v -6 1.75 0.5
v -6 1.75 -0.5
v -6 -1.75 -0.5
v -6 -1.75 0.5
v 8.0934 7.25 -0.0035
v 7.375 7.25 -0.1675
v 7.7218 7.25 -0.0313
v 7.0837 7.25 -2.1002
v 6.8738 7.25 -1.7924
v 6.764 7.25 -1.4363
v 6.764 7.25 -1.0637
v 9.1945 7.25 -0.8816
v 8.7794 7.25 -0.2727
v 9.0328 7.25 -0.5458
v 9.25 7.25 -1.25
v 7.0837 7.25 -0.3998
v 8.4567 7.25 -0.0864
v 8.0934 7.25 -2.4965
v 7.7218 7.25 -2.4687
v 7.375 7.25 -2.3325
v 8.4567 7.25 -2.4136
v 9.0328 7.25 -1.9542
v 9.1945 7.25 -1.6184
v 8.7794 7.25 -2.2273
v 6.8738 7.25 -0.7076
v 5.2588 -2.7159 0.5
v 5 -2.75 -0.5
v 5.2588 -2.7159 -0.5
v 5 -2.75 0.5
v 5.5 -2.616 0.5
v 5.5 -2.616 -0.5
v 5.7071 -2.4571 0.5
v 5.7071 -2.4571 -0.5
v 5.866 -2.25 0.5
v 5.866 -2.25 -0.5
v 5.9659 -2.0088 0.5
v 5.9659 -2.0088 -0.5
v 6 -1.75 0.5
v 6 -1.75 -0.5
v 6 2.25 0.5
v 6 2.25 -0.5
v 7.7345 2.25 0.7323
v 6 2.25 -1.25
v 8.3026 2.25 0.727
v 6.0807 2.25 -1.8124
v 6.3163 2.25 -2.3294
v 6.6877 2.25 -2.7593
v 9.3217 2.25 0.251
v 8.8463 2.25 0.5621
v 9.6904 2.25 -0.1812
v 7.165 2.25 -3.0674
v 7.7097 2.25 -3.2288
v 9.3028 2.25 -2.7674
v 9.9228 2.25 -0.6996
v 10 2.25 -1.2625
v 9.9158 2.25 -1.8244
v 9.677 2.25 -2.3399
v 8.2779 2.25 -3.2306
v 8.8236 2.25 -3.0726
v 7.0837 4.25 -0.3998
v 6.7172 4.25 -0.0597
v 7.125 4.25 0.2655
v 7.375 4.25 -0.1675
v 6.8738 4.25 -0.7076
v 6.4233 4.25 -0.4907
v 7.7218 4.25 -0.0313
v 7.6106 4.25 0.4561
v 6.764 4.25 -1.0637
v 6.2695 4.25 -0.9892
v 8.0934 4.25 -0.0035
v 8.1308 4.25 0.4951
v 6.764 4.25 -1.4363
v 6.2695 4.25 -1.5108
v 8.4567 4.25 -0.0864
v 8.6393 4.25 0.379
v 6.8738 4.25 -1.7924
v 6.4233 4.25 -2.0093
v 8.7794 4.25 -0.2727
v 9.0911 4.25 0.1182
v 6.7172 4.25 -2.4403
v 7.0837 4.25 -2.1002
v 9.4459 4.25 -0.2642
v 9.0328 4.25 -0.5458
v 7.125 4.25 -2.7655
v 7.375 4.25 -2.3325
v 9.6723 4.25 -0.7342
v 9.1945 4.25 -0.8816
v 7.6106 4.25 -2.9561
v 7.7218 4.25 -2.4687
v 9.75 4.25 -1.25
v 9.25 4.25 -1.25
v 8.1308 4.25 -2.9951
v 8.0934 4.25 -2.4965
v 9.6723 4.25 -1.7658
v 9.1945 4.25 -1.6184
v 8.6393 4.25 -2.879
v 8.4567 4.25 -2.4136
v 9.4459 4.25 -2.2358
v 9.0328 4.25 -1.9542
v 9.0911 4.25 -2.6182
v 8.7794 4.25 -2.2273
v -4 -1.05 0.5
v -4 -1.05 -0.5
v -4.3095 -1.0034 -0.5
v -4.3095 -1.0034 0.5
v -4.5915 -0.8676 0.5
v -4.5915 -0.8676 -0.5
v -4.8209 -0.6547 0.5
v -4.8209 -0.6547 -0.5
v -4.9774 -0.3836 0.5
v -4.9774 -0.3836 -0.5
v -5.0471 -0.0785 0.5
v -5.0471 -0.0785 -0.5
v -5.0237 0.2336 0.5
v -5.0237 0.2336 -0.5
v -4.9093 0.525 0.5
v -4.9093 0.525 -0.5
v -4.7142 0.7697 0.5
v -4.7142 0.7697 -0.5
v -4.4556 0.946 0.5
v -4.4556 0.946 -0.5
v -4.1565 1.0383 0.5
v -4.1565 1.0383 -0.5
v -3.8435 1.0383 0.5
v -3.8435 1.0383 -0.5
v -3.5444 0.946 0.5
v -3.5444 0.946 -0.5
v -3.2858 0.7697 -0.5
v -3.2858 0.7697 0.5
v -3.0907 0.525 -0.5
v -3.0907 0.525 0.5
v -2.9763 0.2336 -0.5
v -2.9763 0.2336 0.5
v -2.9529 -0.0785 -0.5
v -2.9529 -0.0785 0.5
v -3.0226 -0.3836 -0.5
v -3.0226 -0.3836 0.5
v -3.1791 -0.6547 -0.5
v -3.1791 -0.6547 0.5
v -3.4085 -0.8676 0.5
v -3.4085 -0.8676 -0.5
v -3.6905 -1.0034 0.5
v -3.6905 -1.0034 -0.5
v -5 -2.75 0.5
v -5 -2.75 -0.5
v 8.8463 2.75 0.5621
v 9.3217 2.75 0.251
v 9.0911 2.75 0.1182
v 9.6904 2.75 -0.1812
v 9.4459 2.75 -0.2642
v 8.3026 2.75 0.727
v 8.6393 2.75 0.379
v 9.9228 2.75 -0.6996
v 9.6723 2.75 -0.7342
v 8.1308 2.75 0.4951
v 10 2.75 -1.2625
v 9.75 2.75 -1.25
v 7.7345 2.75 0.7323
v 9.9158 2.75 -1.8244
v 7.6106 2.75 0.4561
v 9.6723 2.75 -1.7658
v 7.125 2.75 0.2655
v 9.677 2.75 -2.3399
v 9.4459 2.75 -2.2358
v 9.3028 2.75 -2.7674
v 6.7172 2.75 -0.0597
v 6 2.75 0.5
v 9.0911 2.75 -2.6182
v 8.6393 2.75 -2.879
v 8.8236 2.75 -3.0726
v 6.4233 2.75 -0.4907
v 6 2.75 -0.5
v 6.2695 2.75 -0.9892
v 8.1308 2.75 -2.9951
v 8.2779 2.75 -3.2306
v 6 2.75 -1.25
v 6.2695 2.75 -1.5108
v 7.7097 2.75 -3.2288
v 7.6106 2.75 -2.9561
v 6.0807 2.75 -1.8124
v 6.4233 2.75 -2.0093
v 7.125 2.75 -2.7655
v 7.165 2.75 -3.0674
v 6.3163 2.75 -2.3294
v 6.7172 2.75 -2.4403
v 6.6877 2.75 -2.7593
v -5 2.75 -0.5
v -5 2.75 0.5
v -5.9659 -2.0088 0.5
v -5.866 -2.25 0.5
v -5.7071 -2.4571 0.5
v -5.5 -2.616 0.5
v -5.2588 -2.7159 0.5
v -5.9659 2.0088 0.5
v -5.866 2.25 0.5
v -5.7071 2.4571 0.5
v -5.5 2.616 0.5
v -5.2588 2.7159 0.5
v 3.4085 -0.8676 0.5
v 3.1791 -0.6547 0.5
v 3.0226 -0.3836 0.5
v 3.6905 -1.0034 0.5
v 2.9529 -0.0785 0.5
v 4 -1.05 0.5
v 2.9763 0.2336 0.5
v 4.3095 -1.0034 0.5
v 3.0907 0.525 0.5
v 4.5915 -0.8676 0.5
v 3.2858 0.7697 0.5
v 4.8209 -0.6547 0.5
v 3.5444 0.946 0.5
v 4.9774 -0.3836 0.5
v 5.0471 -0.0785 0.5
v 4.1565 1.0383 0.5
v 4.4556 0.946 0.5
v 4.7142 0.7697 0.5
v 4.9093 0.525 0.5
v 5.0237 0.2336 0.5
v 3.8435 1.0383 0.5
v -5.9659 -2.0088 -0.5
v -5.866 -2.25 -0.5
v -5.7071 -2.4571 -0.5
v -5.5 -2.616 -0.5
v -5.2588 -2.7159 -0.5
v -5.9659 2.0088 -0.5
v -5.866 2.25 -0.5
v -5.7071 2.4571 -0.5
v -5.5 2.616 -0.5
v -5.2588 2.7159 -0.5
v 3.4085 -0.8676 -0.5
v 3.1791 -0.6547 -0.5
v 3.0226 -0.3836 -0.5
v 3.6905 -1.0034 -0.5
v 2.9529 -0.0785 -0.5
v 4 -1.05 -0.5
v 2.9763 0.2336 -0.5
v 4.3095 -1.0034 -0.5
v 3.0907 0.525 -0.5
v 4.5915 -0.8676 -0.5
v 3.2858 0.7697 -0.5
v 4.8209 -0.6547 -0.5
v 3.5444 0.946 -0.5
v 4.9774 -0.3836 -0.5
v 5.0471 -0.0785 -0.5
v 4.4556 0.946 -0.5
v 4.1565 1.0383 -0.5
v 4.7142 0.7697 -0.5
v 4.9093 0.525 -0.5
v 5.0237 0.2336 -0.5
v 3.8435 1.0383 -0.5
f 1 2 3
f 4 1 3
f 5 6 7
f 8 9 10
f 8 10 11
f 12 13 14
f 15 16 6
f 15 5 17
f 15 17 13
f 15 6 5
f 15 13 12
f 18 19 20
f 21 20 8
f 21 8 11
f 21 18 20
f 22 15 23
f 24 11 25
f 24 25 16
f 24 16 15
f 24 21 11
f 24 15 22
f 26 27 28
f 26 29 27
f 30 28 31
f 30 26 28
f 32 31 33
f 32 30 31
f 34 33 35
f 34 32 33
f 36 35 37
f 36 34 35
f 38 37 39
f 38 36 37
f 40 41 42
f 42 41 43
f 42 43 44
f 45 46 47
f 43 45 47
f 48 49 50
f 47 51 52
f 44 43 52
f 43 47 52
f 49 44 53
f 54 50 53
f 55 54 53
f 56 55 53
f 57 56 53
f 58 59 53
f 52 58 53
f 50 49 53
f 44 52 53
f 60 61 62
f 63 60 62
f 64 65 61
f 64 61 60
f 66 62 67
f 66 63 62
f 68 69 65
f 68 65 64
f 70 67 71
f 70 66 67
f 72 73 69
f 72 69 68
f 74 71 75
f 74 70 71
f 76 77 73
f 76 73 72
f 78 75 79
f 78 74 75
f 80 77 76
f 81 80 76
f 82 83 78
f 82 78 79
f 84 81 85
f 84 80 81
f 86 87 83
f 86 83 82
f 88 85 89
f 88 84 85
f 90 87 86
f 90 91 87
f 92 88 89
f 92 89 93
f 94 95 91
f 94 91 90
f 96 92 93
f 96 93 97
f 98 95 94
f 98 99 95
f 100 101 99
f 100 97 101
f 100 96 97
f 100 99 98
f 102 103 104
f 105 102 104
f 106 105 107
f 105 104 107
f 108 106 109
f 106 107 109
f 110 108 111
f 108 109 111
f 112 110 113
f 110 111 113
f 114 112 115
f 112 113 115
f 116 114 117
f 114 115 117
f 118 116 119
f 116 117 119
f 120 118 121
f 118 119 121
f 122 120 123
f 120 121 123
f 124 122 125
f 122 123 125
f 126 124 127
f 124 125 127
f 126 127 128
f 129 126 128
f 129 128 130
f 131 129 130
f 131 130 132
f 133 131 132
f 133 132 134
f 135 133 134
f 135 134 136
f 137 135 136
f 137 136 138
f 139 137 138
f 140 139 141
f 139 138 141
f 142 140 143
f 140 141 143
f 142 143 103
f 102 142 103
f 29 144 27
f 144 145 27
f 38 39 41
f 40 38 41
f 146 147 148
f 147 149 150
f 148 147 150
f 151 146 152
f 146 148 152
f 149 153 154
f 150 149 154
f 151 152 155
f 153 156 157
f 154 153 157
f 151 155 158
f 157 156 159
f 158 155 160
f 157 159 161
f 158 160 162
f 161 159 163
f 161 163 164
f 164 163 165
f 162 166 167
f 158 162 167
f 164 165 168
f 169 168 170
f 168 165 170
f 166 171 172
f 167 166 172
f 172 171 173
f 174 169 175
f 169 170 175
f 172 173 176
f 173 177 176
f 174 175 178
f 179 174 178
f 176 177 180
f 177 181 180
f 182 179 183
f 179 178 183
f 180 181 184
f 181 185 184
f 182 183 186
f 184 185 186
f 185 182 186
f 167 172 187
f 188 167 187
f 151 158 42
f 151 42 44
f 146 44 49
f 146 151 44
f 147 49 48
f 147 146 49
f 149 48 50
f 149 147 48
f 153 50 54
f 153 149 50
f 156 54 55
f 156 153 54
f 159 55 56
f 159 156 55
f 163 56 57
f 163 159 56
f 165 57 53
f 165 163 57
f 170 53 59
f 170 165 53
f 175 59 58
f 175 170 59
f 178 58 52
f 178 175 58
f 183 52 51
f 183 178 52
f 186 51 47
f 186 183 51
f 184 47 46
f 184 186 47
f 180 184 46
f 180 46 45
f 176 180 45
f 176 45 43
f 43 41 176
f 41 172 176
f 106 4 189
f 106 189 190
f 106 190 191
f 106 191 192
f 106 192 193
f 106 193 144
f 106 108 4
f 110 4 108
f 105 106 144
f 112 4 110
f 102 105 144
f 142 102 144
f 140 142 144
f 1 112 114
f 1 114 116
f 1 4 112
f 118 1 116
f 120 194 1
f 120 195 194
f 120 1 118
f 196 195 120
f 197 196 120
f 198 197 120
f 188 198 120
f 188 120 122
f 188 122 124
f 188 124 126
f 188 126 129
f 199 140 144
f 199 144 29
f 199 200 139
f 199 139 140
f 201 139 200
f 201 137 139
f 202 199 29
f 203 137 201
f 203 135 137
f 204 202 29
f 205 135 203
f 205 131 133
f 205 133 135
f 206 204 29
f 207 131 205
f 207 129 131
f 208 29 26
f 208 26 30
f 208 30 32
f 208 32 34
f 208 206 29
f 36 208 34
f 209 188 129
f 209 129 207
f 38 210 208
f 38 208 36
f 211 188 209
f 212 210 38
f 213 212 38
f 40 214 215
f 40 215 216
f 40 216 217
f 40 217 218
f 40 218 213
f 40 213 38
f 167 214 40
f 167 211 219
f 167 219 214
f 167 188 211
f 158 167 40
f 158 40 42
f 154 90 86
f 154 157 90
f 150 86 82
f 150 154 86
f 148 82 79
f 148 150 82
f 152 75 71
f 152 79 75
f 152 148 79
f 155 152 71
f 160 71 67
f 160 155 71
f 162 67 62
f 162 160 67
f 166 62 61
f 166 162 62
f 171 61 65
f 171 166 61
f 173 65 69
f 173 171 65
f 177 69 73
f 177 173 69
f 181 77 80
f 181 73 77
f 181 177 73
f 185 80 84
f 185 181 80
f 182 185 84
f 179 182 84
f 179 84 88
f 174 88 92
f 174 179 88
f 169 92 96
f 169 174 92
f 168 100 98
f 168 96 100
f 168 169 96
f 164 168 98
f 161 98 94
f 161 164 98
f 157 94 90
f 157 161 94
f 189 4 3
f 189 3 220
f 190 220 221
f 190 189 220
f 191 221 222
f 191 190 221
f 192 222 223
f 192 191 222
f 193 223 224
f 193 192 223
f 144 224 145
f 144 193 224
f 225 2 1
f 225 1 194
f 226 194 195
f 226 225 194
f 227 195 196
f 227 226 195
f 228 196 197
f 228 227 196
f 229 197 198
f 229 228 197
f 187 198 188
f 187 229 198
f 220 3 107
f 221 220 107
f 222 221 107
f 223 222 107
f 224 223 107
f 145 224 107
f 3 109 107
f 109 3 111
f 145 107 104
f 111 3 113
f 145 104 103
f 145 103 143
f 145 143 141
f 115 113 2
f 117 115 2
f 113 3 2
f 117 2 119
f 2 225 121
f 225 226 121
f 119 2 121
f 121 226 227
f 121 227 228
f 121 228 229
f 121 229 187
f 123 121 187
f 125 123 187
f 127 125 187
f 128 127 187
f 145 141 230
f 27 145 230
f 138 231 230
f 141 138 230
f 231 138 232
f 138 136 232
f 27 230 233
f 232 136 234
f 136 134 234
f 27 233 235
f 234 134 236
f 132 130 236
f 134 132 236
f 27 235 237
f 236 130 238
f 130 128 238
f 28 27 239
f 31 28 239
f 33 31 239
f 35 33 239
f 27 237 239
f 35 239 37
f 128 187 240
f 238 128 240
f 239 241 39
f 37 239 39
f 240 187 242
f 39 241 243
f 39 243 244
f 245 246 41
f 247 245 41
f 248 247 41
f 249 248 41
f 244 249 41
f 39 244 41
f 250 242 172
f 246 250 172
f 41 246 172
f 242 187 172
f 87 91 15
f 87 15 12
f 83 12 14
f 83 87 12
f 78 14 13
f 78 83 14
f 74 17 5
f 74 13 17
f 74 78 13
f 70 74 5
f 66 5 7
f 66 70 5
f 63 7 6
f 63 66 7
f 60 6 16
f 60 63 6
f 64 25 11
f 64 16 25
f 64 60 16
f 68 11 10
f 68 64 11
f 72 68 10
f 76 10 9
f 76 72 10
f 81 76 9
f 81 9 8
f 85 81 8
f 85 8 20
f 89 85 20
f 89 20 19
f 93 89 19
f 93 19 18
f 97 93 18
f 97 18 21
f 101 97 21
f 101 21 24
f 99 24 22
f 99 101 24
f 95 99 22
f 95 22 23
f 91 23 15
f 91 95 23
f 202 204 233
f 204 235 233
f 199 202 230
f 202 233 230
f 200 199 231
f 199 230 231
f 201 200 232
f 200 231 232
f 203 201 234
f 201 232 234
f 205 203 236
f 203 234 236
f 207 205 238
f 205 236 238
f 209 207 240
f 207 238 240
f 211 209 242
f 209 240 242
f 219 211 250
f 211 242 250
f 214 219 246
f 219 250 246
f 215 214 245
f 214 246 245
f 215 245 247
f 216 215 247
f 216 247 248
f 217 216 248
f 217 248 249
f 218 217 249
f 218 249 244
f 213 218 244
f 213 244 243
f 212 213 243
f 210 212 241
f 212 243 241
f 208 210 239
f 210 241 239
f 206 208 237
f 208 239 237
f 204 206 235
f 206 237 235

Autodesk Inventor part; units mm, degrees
ref_plane "YZ Plane" through (0, 0, 0) normal (1, 0, 0) x (0, 1, 0)
ref_plane "XZ Plane" through (0, 0, 0) normal (0, 1, 0) x (-1, 0, 0)
ref_plane "XY Plane" through (0, 0, 0) normal (0, 0, 1) x (1, 0, 0)
sketch "スケッチ1" plane through (0, 0, 0) normal (0, 0, 1) x (1, 0, 0)
  line L0 (-6, -2.75) -> (6, -2.75)
  line L1 (6, -2.75) -> (6, 2.75)
  line L2 (6, 2.75) -> (-6, 2.75)
  line L3 (-6, 2.75) -> (-6, -2.75)
  line L4 (-6, -2.75) -> (6, 2.75) construction
  line L5 (6, -2.75) -> (-6, 2.75) construction
  point P0 (0, 0)
  point P1 (0, 0)
  point P2 (0, 0)
  dimension "d0" = 12
  dimension "d1" = 5.5
extrude "押し出し1" add sketch "スケッチ1" along normal mid plane 1
sketch "スケッチ2" plane through (-6, 2.75, 0.5) normal (0, 1, 0) x (1, 0, 0)
  circle A0 centre (14, 1.75) radius 1.75
  line L0 (12, 0) -> (0, 0) projected
  line L1 (12, 1) -> (12, 0) projected
  circle A1 centre (14, 1.75) radius 2
  line L2 (12, 0) -> (13.7345, -0.2323)
  line L3 (12, 1) -> (12, 1.75)
  point P0 (6, 0.5)
  dimension "d4" = 3.5
  dimension "d5" = 4
extrude "押し出し2" add sketch "スケッチ2" against normal blind 0.5 contours A0 | L3 A1 L2 L1 | A1
sketch "スケッチ3" plane through (-6, 2.75, 0.5) normal (0, 1, 0) x (1, 0, 0)
  arc A0 (13.7345, -0.2323) -> (12, 1.75) centre (14, 1.75) ccw projected
  circle A1 centre (14, 1.75) radius 1.75
  point P0 (6, 0.5)
  dimension "d8" = 3.5
extrude "押し出し3" add sketch "スケッチ3" along normal blind 1.5
sketch "スケッチ4" plane through (8, 4.25, -1.25) normal (0, 1, 0) x (1, 0, 0)
  circle A0 centre (0, 0) radius 1.25
  circle A1 centre (0, 0) radius 1.75 projected
  point P0 (-8, -1.25)
  dimension "d11" = 2.5
extrude "押し出し4" add sketch "スケッチ4" along normal blind 3 contours A0
sketch "スケッチ5" plane through (0, 0, 0.5) normal (0, 0, 1) x (1, 0, 0)
  line L0 (-6, 2.75) -> (-6, -2.75) projected
  line L1 (6, -2.75) -> (6, 2.25) projected
  line L2 (-6, 0) -> (6, 0) construction
  point P0 (0, 0)
  point P1 (-4, 0)
  point P2 (4, 0)
  point P3 (0, 0)
  dimension "d14" = 4
  dimension "d15" = 4
hole "穴1" at (-4, 0, 0.5) at (4, 0, 0.5) direction (0, 0, -1) diameter 2.1 depth 4 tip angle 118
fillet "フィレット1" radius 1 3 edges at (6, -2.75, 0) (-6, -2.75, 0) (-6, 2.75, 0)
equation "\"d15\" = d14"
properties part number "hinge"
